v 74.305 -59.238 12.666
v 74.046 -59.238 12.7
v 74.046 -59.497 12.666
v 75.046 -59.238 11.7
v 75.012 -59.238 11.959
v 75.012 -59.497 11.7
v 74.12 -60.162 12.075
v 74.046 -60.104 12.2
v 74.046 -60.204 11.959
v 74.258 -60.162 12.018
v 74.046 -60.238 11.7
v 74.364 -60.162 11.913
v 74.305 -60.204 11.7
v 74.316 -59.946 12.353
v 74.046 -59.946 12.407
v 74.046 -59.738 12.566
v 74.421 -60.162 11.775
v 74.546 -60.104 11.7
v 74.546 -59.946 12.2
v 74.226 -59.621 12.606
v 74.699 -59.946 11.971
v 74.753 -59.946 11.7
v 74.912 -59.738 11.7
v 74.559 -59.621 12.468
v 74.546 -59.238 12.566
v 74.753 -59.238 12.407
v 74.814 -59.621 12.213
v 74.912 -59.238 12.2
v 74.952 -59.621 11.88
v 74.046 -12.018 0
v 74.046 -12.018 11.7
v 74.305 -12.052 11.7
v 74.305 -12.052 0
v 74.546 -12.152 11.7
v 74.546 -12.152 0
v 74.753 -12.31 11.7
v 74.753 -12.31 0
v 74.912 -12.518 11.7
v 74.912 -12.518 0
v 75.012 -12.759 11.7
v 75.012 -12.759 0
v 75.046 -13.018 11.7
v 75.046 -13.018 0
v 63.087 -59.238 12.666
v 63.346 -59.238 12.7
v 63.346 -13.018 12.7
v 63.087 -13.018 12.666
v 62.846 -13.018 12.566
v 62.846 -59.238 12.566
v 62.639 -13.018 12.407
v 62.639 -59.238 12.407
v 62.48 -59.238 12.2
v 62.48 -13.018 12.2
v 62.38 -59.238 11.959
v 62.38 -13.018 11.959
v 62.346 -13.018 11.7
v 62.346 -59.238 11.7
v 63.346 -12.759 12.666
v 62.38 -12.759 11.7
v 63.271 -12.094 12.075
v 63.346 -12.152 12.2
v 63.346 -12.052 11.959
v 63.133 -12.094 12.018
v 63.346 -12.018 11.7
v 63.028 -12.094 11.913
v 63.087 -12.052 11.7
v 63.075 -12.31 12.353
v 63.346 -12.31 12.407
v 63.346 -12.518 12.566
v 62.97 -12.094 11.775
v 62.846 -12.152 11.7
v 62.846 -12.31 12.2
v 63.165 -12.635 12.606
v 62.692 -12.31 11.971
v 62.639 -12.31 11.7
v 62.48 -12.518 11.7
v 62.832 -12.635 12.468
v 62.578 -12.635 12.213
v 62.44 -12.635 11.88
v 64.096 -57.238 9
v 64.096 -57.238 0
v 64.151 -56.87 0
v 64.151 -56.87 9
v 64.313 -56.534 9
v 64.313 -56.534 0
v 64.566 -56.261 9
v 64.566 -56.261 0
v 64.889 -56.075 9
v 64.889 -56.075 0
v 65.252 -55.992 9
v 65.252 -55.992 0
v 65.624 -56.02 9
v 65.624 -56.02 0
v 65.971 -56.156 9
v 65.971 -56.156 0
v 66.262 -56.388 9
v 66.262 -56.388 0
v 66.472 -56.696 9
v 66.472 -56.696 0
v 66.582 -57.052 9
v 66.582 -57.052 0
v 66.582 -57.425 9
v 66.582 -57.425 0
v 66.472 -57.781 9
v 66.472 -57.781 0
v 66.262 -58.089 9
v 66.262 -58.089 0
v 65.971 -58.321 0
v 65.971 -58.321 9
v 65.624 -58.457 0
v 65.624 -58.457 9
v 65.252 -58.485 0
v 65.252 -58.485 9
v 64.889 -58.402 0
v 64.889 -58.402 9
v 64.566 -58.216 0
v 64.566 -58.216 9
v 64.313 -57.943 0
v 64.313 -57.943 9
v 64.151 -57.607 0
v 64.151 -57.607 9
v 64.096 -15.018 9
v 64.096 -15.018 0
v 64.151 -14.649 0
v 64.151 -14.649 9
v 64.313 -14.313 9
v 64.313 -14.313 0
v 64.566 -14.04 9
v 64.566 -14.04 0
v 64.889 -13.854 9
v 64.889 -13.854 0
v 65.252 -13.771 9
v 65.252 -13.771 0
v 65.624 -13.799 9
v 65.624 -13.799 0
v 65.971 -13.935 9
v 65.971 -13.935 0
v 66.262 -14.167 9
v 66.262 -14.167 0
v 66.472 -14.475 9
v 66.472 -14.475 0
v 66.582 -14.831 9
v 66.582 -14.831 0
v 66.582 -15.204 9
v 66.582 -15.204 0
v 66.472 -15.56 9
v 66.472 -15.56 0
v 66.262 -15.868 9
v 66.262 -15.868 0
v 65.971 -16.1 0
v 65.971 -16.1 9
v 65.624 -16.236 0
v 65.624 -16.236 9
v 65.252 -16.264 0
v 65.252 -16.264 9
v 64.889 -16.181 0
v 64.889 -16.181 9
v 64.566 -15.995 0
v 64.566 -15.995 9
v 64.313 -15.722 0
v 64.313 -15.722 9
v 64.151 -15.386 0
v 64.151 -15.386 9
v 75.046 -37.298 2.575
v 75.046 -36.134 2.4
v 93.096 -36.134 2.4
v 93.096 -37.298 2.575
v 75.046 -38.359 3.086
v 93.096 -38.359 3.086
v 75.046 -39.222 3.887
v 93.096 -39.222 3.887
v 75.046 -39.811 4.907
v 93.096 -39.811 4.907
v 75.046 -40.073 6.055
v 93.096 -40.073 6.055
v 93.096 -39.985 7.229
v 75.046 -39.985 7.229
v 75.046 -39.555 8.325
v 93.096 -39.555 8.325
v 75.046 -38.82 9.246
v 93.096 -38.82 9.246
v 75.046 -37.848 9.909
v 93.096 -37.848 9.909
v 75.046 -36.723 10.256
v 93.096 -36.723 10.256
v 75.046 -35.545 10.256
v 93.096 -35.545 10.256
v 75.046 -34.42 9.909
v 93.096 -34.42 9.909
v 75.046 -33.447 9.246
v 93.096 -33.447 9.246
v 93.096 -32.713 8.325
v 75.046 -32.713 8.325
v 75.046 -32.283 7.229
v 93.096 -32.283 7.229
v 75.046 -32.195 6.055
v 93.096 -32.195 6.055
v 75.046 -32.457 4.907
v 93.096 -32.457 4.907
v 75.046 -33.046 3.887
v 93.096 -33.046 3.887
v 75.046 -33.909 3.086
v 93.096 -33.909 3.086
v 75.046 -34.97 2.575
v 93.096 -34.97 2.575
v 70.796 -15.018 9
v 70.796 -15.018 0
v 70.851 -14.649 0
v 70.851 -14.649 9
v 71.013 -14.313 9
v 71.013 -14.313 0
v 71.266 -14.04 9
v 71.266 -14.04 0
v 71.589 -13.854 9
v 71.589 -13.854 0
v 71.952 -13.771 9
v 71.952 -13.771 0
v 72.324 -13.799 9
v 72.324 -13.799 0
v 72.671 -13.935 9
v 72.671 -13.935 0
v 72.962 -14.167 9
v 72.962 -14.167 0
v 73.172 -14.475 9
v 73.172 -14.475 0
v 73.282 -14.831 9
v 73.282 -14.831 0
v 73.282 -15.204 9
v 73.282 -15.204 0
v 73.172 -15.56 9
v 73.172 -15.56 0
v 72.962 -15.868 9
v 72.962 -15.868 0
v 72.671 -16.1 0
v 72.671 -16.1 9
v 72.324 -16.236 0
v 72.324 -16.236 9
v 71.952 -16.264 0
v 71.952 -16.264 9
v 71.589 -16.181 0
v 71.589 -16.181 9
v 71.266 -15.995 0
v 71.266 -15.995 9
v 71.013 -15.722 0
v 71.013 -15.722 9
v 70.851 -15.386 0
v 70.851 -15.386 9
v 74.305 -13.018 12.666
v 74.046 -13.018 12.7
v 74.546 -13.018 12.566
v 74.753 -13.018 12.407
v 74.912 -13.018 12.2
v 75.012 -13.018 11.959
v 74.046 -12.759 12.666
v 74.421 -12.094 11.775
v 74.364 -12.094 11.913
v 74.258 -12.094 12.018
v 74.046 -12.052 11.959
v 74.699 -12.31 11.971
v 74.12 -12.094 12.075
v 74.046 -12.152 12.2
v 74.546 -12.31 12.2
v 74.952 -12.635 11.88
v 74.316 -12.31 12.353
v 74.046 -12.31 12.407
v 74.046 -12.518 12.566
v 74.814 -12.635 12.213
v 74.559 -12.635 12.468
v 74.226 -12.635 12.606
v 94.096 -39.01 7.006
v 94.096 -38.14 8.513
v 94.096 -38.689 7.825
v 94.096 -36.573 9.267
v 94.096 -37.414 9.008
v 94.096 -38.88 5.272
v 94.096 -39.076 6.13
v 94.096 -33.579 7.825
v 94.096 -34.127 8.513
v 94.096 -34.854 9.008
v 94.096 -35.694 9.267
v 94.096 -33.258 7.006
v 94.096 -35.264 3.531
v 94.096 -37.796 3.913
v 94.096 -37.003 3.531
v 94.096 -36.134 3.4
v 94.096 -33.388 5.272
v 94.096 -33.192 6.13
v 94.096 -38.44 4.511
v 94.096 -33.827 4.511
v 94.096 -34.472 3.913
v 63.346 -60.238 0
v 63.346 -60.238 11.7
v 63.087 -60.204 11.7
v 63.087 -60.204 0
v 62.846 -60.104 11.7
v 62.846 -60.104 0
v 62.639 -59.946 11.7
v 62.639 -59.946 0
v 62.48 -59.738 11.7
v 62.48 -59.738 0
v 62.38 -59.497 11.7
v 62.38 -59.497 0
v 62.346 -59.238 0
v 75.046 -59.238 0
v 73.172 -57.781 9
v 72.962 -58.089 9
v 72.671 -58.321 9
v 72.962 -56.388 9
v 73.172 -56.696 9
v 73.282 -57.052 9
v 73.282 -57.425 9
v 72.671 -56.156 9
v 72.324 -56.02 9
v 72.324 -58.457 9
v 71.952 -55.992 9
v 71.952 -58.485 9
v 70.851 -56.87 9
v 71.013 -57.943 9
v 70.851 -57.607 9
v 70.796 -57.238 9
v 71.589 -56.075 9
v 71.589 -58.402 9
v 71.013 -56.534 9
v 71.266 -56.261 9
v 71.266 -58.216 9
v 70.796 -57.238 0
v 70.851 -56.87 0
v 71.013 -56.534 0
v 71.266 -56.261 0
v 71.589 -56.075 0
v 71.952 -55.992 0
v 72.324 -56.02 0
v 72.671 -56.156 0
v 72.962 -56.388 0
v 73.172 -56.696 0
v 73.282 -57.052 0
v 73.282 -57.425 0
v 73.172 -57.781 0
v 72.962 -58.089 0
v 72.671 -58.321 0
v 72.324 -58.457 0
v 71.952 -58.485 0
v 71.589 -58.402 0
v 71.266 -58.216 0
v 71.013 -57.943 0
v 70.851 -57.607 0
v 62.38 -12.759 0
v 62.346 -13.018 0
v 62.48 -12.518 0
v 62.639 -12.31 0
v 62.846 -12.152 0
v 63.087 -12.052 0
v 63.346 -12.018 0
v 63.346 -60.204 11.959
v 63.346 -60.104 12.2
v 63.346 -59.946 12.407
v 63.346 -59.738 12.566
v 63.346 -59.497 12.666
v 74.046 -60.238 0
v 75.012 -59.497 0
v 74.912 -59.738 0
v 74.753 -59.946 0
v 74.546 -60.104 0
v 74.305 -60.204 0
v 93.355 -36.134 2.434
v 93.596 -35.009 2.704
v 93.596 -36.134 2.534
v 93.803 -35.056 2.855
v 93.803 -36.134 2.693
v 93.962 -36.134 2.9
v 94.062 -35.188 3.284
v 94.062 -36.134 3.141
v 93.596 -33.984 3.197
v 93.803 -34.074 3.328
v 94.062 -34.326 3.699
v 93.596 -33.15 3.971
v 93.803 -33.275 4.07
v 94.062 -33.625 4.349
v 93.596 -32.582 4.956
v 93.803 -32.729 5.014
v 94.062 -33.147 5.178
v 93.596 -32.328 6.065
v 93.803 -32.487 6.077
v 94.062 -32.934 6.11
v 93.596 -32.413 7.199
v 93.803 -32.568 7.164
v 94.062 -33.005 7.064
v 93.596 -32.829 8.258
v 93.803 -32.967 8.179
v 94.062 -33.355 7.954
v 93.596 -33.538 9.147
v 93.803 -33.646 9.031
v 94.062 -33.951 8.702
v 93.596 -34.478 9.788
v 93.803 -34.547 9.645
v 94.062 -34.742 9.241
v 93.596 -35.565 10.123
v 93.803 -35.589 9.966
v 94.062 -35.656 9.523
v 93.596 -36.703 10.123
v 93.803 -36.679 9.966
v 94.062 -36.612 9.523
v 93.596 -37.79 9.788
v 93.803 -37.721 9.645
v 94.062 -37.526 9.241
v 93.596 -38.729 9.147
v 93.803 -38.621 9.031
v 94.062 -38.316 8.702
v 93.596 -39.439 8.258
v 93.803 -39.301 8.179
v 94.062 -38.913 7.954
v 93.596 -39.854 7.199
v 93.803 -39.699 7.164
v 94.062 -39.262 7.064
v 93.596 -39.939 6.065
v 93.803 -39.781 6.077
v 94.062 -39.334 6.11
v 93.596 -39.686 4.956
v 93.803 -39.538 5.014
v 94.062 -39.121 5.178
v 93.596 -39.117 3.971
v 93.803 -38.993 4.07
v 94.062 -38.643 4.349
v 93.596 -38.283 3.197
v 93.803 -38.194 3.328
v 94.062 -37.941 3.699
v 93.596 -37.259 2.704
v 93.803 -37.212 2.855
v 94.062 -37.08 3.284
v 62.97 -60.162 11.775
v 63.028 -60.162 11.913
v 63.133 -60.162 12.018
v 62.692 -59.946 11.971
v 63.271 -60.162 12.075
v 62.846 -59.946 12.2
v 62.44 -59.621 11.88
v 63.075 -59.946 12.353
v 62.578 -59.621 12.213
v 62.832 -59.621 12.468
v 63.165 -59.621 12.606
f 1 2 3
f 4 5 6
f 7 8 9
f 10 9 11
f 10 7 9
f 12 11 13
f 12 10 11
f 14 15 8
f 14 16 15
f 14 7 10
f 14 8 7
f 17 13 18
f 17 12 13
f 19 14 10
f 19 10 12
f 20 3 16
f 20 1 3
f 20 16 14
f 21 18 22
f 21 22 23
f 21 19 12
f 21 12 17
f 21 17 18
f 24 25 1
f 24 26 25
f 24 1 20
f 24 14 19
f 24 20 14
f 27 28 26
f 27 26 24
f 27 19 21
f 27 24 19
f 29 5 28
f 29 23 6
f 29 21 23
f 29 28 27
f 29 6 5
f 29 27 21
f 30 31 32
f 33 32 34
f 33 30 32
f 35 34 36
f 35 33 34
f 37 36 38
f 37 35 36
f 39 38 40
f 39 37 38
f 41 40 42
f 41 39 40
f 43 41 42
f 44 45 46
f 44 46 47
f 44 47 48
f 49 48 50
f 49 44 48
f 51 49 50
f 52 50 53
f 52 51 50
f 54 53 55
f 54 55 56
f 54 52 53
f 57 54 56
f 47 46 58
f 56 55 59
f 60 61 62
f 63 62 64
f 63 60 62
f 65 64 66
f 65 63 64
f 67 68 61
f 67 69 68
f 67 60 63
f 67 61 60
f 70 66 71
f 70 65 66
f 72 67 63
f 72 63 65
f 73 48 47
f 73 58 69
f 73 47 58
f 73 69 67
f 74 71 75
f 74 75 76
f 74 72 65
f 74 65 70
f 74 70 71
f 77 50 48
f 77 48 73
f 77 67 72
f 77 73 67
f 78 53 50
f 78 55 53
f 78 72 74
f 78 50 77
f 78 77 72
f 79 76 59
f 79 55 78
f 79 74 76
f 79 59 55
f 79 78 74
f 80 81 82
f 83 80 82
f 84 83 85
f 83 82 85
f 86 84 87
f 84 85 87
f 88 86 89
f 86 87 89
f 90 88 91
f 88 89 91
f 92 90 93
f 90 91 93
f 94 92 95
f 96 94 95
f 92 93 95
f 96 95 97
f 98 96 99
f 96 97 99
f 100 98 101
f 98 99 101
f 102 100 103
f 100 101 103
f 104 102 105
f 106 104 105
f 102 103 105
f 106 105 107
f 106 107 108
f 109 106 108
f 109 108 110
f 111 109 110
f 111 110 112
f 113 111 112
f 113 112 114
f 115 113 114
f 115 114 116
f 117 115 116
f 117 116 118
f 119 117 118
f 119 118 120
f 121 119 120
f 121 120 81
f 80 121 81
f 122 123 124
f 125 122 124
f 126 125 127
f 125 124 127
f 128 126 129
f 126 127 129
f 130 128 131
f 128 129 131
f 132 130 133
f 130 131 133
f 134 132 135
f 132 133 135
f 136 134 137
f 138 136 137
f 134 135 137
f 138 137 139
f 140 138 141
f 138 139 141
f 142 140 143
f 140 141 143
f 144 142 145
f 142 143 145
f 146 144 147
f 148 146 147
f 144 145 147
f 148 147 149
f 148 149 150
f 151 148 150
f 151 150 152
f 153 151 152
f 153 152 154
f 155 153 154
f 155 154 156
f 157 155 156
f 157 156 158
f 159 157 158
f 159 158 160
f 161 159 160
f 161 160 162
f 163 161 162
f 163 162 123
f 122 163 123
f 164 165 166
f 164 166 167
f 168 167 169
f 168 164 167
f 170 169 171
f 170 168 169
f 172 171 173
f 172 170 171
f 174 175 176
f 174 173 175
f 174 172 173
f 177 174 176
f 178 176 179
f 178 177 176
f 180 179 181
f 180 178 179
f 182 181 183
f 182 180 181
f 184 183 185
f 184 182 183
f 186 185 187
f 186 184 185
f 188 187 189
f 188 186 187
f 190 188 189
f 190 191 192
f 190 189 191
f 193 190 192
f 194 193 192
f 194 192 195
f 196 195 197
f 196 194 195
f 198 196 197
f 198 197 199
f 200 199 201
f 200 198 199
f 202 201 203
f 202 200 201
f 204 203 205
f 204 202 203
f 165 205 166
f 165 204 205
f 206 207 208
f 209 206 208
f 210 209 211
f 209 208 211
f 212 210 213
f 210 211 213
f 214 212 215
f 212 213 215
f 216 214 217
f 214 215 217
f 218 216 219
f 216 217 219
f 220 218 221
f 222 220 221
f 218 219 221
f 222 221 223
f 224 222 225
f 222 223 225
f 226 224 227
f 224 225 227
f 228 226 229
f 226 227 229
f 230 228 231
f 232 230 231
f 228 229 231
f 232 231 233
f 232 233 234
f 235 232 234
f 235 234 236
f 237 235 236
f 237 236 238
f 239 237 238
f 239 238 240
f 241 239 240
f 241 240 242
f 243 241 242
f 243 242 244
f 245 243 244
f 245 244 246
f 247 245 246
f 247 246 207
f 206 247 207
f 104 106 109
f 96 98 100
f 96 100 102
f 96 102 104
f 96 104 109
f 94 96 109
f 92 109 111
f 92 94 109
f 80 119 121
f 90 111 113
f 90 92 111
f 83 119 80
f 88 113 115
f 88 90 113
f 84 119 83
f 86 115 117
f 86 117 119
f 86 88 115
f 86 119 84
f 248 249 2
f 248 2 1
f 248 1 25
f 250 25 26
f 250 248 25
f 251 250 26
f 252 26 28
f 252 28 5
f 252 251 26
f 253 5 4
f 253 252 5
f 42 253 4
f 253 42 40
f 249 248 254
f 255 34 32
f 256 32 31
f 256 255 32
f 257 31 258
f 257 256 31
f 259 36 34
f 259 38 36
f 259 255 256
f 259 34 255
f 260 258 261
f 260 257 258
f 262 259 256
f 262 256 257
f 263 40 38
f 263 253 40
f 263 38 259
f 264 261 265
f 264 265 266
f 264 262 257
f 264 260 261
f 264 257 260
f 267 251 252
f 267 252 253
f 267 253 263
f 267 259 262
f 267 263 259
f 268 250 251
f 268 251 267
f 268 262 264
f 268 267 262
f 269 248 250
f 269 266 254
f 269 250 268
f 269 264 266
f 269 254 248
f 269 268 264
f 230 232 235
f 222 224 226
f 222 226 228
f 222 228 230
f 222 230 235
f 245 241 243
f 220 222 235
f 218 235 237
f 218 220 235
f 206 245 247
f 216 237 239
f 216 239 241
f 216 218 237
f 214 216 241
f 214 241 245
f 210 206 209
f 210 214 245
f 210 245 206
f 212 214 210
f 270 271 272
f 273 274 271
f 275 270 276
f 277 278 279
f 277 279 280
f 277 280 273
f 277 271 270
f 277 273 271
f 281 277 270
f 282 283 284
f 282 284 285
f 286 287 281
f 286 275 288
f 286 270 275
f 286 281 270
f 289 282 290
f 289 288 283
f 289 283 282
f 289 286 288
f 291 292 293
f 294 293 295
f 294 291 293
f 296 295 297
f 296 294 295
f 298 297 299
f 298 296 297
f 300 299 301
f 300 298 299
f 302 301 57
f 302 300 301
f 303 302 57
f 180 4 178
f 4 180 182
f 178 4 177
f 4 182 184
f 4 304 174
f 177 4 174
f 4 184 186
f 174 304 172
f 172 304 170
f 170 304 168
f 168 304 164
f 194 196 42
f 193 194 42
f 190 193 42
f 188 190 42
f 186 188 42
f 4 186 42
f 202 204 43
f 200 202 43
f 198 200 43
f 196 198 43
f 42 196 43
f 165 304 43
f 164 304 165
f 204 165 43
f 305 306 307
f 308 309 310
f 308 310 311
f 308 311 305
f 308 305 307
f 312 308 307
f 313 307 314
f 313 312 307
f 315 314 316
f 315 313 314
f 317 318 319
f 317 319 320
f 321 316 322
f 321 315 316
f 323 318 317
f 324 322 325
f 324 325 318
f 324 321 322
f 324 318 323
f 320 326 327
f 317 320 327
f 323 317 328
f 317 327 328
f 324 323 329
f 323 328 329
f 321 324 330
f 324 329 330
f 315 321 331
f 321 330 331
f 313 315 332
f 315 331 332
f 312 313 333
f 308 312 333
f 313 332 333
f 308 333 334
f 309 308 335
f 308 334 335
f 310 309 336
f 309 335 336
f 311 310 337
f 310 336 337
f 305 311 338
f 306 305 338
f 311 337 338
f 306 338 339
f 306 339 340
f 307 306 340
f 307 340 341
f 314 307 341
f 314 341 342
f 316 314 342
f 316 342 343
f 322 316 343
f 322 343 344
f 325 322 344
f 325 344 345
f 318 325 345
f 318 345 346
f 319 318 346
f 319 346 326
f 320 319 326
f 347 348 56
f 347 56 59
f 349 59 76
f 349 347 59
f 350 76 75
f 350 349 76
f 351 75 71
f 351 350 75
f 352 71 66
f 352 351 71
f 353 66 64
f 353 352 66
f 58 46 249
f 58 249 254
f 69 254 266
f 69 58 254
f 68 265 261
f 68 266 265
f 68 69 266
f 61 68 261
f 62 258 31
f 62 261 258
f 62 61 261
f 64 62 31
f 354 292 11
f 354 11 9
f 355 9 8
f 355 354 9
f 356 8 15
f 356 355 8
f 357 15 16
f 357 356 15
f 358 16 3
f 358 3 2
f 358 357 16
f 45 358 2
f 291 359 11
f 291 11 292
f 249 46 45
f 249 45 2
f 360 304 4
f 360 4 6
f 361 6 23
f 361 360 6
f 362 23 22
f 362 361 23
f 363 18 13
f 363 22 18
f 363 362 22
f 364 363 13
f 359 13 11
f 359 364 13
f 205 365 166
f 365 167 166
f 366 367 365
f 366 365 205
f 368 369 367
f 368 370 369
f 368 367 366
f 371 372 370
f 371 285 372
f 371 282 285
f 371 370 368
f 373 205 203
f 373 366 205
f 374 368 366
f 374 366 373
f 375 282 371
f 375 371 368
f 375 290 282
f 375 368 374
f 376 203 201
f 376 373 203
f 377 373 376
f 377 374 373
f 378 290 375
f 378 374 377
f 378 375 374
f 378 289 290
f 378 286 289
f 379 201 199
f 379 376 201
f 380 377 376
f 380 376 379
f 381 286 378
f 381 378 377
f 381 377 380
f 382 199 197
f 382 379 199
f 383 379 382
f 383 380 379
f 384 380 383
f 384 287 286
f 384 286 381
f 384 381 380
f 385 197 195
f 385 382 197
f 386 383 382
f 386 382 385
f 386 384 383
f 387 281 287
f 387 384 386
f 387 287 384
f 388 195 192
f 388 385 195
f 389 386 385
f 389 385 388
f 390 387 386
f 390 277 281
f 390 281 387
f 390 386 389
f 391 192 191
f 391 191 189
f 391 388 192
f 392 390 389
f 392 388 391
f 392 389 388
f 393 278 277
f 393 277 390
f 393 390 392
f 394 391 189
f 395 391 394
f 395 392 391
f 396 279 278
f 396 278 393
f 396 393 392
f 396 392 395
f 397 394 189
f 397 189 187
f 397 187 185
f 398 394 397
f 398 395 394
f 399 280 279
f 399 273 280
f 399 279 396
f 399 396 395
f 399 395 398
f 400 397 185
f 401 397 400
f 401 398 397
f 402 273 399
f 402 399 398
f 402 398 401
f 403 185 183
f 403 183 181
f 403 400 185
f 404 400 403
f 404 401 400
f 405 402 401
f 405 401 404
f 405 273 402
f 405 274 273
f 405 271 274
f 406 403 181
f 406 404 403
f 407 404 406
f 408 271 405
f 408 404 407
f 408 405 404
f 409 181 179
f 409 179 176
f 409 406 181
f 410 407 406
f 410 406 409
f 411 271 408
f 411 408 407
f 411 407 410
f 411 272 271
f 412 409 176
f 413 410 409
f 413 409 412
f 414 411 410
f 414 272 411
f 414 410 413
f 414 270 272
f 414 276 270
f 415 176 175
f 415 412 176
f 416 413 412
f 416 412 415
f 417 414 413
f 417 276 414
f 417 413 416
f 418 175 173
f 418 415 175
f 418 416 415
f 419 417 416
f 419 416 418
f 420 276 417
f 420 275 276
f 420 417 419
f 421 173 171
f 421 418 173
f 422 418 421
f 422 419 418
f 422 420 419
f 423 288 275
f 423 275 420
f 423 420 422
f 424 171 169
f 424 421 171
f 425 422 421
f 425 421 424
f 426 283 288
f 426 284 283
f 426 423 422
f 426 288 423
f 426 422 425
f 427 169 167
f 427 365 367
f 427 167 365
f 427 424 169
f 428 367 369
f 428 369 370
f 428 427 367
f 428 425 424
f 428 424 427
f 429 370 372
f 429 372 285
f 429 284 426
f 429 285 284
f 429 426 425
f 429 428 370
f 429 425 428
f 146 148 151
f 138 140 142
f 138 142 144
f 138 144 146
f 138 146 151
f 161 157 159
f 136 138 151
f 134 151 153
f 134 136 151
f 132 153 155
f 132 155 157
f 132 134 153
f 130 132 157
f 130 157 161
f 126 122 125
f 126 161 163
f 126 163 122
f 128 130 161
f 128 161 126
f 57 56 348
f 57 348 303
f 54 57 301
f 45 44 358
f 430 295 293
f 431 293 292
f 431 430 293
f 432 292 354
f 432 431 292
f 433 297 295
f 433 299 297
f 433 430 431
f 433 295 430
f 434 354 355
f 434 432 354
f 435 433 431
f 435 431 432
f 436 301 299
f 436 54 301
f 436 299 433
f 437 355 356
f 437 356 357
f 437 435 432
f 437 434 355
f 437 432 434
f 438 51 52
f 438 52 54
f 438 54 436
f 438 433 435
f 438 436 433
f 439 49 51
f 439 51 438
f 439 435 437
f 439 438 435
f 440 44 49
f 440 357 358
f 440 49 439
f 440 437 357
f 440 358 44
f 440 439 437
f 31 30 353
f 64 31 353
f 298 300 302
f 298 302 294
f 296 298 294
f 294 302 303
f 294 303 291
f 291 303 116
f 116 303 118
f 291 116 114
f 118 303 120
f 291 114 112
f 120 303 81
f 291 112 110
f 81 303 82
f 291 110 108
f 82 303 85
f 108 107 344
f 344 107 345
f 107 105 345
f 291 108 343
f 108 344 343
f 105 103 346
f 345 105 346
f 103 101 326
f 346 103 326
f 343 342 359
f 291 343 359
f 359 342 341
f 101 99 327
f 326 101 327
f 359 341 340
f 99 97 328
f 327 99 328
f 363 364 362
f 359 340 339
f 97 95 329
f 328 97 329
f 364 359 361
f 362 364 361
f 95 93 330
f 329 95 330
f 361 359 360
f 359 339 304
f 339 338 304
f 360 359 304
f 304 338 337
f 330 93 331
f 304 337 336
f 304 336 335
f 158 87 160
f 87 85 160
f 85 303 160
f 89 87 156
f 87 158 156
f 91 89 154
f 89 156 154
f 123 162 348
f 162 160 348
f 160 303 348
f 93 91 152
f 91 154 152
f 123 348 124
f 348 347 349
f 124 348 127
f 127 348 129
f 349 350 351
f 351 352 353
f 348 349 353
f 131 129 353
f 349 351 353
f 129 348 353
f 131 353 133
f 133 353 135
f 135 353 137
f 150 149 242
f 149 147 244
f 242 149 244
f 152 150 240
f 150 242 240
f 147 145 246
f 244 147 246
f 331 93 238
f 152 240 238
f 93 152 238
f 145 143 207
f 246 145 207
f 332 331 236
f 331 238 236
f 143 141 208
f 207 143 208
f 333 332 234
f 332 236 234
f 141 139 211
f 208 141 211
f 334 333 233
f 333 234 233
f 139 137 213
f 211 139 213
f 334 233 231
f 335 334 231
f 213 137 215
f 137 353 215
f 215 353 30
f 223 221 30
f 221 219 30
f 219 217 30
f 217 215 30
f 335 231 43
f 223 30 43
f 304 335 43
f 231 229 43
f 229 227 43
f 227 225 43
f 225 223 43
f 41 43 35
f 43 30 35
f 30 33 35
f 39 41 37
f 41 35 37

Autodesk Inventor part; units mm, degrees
ref_plane "YZ Plane" through (0, 0, 0) normal (1, 0, 0) x (0, 1, 0)
ref_plane "XZ Plane" through (0, 0, 0) normal (0, 1, 0) x (-1, 0, 0)
ref_plane "XY Plane" through (0, 0, 0) normal (0, 0, 1) x (1, 0, 0)
sketch "Sketch1" plane through (0, 0, 0) normal (0, 0, 1) x (1, 0, 0)
  line L0 (100.4457, -5.6676) -> (100.4457, -66.5884) projected
  line L1 (75.0457, -66.5884) -> (75.0457, -5.6676) projected
  line L2 (75.0457, -5.6676) -> (55.9957, -5.6676)
  line L3 (55.9957, -5.6676) -> (55.9957, -66.5884)
  line L4 (55.9957, -66.5884) -> (75.0457, -66.5884)
  line L5 (75.0457, -66.5884) -> (75.0457, -5.6676)
  line L6 (75.0457, -5.6676) -> (62.3457, -5.6676)
  line L7 (62.3457, -5.6676) -> (62.3457, -66.5884)
  line L8 (62.3457, -66.5884) -> (75.0457, -66.5884)
  line L9 (75.0457, -66.5884) -> (75.0457, -5.6676)
  line L10 (55.9957, -5.6676) -> (59.1707, -5.6676)
  line L11 (59.1707, -5.6676) -> (59.1707, -66.5884)
  line L12 (59.1707, -5.6676) -> (59.1707, -12.0176)
  circle A0 centre (59.1707, -12.0176) radius 1.5
  line L13 (59.1707, -66.5884) -> (59.1707, -60.2384)
  circle A1 centre (59.1707, -60.2384) radius 1.5
  line L14 (59.1707, -12.0176) -> (59.1707, -36.1222)
  circle A2 centre (59.1707, -36.1222) radius 1.5
  point P0 (0, 0)
  dimension "d0" = 19.05
  dimension "d1" = 12.7
  dimension "d2" = 3.175
  dimension "d3" = 6.35
  dimension "d4" = 3
  dimension "d5" = 6.35
  dimension "d6" = 3
  dimension "d7" = 24.1046
  dimension "d8" = 3
extrude "Extrusion1" add sketch "Sketch1" along normal blind 12.7
sketch "Sketch2" plane through (75.0457, -66.5884, 0) normal (1, 0, 0) x (0, 0, -1)
  line L0 (0, 60.9208) -> (0, 0) projected
  line L1 (0, 0) -> (0, 30.4546)
  line L2 (0, 30.4546) -> (-6.35, 30.4546)
  circle A0 centre (-6.35, 30.4546) radius 3.95
  point P0 (0, 66.5884)
  dimension "d11" = 30.4546
  dimension "d12" = 6.35
  dimension "d13" = 7.9
extrude "Extrusion2" add sketch "Sketch2" along normal blind 19.05
sketch "Sketch3" plane through (0, 0, 12.7) normal (0, 0, 1) x (1, 0, 0)
  line L0 (75.0457, -5.6676) -> (55.9957, -5.6676)
  line L1 (55.9957, -5.6676) -> (55.9957, -66.5884)
  line L2 (55.9957, -66.5884) -> (75.0457, -66.5884)
  line L3 (75.0457, -5.6676) -> (62.3457, -5.6676)
  line L4 (62.3457, -5.6676) -> (62.3457, -66.5884)
  line L5 (62.3457, -66.5884) -> (75.0457, -66.5884)
  line L6 (55.9957, -5.6676) -> (59.1707, -5.6676)
  line L7 (59.1707, -5.6676) -> (59.1707, -66.5884)
  line L8 (59.1707, -5.6676) -> (59.1707, -12.0176)
  circle A0 centre (59.1707, -12.0176) radius 1.5
  line L9 (59.1707, -66.5884) -> (59.1707, -60.2384)
  circle A1 centre (59.1707, -60.2384) radius 1.5
  line L10 (59.1707, -12.0176) -> (59.1707, -36.1222)
  circle A2 centre (59.1707, -36.1222) radius 1.5
  line L11 (55.9957, -5.6676) -> (62.3457, -5.6676)
  line L12 (62.3457, -5.6676) -> (62.3457, -66.5884)
  line L13 (62.3457, -66.5884) -> (55.9957, -66.5884)
  line L14 (55.9957, -66.5884) -> (55.9957, -5.6676)
  line L15 (75.0457, -66.5884) -> (75.0457, -5.6676) projected
  line L16 (62.3457, -5.6676) -> (75.0457, -5.6676)
  line L17 (75.0457, -5.6676) -> (75.0457, -12.0176)
  line L18 (75.0457, -12.0176) -> (62.3457, -12.0176)
  line L19 (62.3457, -12.0176) -> (62.3457, -5.6676)
  line L20 (62.3457, -66.5884) -> (75.0457, -66.5884)
  line L21 (75.0457, -66.5884) -> (75.0457, -60.2384)
  line L22 (75.0457, -60.2384) -> (62.3457, -60.2384)
  line L23 (62.3457, -60.2384) -> (62.3457, -66.5884)
  point P0 (0, 0)
  dimension "d16" = 19.05
  dimension "d17" = 12.7
  dimension "d18" = 3.175
  dimension "d19" = 6.35
  dimension "d20" = 3
  dimension "d21" = 6.35
  dimension "d22" = 3
  dimension "d23" = 24.1046
  dimension "d24" = 3
  dimension "d27" = 60.9208
  dimension "d28" = 6.35
  dimension "d29" = 6.35
extrude "Extrusion3" cut sketch "Sketch3" against normal blind 2540 contours L15 L18 L4 L0 | L4 L2 L7 A1 A2 A0 L0 | L7 A0 A2 A1 L2 L1 L0 | L15 L2 L4 L22 | A0 L7 | L7 A0 | A2 L7 | L7 A2 | A1 L7 | L7 A1
fillet "Fillet1" radius 1 8 edges at (62.3457, -36.128, 12.7) (75.0457, -36.128, 12.7) (68.6957, -60.2384, 12.7) (68.6957, -12.0176, 12.7) (62.3457, -12.0176, 6.35) (62.3457, -60.2384, 6.35) (75.0457, -60.2384, 6.35) (75.0457, -12.0176, 6.35)
fillet "Fillet2" radius 1 1 edges at (94.0957, -36.1338, 10.3)
fillet "Fillet3" [suppressed]
sketch "Sketch5" plane through (0, 0, 0) normal (0, 0, -1) x (-1, 0, 0)
  line L0 (-63.3457, -12.0176) -> (-74.0457, -12.0176) projected
  line L1 (-74.0457, -12.0176) -> (-72.0457, -12.0176)
  line L2 (-72.0457, -12.0176) -> (-72.0457, -15.0176)
  circle A0 centre (-72.0457, -15.0176) radius 1.25
  line L3 (-68.6957, -12.0176) -> (-68.6957, -9.3578)
  line L4 (-62.3457, -59.2384) -> (-62.3457, -13.0176) projected
  line L5 (-62.3457, -36.128) -> (-58.1504, -36.128)
  line L6 (-74.0457, -12.0176) -> (-63.3457, -12.0176)
  line L7 (-63.3457, -12.0176) -> (-65.3457, -12.0176)
  line L8 (-65.3457, -12.0176) -> (-65.3457, -15.0176)
  circle A1 centre (-65.3457, -15.0176) radius 1.25
  line L9 (-72.0457, -60.2384) -> (-72.0457, -57.2384)
  circle A2 centre (-72.0457, -57.2384) radius 1.25
  line L10 (-65.3457, -60.2384) -> (-65.3457, -57.2384)
  circle A3 centre (-65.3457, -57.2384) radius 1.25
  point P0 (0, 0)
  dimension "d48" = 2
  dimension "d49" = 3
  dimension "d50" = 2.5
extrude "Extrusion5" cut sketch "Sketch5" against normal blind 9
properties part number "BackWheelMount"
